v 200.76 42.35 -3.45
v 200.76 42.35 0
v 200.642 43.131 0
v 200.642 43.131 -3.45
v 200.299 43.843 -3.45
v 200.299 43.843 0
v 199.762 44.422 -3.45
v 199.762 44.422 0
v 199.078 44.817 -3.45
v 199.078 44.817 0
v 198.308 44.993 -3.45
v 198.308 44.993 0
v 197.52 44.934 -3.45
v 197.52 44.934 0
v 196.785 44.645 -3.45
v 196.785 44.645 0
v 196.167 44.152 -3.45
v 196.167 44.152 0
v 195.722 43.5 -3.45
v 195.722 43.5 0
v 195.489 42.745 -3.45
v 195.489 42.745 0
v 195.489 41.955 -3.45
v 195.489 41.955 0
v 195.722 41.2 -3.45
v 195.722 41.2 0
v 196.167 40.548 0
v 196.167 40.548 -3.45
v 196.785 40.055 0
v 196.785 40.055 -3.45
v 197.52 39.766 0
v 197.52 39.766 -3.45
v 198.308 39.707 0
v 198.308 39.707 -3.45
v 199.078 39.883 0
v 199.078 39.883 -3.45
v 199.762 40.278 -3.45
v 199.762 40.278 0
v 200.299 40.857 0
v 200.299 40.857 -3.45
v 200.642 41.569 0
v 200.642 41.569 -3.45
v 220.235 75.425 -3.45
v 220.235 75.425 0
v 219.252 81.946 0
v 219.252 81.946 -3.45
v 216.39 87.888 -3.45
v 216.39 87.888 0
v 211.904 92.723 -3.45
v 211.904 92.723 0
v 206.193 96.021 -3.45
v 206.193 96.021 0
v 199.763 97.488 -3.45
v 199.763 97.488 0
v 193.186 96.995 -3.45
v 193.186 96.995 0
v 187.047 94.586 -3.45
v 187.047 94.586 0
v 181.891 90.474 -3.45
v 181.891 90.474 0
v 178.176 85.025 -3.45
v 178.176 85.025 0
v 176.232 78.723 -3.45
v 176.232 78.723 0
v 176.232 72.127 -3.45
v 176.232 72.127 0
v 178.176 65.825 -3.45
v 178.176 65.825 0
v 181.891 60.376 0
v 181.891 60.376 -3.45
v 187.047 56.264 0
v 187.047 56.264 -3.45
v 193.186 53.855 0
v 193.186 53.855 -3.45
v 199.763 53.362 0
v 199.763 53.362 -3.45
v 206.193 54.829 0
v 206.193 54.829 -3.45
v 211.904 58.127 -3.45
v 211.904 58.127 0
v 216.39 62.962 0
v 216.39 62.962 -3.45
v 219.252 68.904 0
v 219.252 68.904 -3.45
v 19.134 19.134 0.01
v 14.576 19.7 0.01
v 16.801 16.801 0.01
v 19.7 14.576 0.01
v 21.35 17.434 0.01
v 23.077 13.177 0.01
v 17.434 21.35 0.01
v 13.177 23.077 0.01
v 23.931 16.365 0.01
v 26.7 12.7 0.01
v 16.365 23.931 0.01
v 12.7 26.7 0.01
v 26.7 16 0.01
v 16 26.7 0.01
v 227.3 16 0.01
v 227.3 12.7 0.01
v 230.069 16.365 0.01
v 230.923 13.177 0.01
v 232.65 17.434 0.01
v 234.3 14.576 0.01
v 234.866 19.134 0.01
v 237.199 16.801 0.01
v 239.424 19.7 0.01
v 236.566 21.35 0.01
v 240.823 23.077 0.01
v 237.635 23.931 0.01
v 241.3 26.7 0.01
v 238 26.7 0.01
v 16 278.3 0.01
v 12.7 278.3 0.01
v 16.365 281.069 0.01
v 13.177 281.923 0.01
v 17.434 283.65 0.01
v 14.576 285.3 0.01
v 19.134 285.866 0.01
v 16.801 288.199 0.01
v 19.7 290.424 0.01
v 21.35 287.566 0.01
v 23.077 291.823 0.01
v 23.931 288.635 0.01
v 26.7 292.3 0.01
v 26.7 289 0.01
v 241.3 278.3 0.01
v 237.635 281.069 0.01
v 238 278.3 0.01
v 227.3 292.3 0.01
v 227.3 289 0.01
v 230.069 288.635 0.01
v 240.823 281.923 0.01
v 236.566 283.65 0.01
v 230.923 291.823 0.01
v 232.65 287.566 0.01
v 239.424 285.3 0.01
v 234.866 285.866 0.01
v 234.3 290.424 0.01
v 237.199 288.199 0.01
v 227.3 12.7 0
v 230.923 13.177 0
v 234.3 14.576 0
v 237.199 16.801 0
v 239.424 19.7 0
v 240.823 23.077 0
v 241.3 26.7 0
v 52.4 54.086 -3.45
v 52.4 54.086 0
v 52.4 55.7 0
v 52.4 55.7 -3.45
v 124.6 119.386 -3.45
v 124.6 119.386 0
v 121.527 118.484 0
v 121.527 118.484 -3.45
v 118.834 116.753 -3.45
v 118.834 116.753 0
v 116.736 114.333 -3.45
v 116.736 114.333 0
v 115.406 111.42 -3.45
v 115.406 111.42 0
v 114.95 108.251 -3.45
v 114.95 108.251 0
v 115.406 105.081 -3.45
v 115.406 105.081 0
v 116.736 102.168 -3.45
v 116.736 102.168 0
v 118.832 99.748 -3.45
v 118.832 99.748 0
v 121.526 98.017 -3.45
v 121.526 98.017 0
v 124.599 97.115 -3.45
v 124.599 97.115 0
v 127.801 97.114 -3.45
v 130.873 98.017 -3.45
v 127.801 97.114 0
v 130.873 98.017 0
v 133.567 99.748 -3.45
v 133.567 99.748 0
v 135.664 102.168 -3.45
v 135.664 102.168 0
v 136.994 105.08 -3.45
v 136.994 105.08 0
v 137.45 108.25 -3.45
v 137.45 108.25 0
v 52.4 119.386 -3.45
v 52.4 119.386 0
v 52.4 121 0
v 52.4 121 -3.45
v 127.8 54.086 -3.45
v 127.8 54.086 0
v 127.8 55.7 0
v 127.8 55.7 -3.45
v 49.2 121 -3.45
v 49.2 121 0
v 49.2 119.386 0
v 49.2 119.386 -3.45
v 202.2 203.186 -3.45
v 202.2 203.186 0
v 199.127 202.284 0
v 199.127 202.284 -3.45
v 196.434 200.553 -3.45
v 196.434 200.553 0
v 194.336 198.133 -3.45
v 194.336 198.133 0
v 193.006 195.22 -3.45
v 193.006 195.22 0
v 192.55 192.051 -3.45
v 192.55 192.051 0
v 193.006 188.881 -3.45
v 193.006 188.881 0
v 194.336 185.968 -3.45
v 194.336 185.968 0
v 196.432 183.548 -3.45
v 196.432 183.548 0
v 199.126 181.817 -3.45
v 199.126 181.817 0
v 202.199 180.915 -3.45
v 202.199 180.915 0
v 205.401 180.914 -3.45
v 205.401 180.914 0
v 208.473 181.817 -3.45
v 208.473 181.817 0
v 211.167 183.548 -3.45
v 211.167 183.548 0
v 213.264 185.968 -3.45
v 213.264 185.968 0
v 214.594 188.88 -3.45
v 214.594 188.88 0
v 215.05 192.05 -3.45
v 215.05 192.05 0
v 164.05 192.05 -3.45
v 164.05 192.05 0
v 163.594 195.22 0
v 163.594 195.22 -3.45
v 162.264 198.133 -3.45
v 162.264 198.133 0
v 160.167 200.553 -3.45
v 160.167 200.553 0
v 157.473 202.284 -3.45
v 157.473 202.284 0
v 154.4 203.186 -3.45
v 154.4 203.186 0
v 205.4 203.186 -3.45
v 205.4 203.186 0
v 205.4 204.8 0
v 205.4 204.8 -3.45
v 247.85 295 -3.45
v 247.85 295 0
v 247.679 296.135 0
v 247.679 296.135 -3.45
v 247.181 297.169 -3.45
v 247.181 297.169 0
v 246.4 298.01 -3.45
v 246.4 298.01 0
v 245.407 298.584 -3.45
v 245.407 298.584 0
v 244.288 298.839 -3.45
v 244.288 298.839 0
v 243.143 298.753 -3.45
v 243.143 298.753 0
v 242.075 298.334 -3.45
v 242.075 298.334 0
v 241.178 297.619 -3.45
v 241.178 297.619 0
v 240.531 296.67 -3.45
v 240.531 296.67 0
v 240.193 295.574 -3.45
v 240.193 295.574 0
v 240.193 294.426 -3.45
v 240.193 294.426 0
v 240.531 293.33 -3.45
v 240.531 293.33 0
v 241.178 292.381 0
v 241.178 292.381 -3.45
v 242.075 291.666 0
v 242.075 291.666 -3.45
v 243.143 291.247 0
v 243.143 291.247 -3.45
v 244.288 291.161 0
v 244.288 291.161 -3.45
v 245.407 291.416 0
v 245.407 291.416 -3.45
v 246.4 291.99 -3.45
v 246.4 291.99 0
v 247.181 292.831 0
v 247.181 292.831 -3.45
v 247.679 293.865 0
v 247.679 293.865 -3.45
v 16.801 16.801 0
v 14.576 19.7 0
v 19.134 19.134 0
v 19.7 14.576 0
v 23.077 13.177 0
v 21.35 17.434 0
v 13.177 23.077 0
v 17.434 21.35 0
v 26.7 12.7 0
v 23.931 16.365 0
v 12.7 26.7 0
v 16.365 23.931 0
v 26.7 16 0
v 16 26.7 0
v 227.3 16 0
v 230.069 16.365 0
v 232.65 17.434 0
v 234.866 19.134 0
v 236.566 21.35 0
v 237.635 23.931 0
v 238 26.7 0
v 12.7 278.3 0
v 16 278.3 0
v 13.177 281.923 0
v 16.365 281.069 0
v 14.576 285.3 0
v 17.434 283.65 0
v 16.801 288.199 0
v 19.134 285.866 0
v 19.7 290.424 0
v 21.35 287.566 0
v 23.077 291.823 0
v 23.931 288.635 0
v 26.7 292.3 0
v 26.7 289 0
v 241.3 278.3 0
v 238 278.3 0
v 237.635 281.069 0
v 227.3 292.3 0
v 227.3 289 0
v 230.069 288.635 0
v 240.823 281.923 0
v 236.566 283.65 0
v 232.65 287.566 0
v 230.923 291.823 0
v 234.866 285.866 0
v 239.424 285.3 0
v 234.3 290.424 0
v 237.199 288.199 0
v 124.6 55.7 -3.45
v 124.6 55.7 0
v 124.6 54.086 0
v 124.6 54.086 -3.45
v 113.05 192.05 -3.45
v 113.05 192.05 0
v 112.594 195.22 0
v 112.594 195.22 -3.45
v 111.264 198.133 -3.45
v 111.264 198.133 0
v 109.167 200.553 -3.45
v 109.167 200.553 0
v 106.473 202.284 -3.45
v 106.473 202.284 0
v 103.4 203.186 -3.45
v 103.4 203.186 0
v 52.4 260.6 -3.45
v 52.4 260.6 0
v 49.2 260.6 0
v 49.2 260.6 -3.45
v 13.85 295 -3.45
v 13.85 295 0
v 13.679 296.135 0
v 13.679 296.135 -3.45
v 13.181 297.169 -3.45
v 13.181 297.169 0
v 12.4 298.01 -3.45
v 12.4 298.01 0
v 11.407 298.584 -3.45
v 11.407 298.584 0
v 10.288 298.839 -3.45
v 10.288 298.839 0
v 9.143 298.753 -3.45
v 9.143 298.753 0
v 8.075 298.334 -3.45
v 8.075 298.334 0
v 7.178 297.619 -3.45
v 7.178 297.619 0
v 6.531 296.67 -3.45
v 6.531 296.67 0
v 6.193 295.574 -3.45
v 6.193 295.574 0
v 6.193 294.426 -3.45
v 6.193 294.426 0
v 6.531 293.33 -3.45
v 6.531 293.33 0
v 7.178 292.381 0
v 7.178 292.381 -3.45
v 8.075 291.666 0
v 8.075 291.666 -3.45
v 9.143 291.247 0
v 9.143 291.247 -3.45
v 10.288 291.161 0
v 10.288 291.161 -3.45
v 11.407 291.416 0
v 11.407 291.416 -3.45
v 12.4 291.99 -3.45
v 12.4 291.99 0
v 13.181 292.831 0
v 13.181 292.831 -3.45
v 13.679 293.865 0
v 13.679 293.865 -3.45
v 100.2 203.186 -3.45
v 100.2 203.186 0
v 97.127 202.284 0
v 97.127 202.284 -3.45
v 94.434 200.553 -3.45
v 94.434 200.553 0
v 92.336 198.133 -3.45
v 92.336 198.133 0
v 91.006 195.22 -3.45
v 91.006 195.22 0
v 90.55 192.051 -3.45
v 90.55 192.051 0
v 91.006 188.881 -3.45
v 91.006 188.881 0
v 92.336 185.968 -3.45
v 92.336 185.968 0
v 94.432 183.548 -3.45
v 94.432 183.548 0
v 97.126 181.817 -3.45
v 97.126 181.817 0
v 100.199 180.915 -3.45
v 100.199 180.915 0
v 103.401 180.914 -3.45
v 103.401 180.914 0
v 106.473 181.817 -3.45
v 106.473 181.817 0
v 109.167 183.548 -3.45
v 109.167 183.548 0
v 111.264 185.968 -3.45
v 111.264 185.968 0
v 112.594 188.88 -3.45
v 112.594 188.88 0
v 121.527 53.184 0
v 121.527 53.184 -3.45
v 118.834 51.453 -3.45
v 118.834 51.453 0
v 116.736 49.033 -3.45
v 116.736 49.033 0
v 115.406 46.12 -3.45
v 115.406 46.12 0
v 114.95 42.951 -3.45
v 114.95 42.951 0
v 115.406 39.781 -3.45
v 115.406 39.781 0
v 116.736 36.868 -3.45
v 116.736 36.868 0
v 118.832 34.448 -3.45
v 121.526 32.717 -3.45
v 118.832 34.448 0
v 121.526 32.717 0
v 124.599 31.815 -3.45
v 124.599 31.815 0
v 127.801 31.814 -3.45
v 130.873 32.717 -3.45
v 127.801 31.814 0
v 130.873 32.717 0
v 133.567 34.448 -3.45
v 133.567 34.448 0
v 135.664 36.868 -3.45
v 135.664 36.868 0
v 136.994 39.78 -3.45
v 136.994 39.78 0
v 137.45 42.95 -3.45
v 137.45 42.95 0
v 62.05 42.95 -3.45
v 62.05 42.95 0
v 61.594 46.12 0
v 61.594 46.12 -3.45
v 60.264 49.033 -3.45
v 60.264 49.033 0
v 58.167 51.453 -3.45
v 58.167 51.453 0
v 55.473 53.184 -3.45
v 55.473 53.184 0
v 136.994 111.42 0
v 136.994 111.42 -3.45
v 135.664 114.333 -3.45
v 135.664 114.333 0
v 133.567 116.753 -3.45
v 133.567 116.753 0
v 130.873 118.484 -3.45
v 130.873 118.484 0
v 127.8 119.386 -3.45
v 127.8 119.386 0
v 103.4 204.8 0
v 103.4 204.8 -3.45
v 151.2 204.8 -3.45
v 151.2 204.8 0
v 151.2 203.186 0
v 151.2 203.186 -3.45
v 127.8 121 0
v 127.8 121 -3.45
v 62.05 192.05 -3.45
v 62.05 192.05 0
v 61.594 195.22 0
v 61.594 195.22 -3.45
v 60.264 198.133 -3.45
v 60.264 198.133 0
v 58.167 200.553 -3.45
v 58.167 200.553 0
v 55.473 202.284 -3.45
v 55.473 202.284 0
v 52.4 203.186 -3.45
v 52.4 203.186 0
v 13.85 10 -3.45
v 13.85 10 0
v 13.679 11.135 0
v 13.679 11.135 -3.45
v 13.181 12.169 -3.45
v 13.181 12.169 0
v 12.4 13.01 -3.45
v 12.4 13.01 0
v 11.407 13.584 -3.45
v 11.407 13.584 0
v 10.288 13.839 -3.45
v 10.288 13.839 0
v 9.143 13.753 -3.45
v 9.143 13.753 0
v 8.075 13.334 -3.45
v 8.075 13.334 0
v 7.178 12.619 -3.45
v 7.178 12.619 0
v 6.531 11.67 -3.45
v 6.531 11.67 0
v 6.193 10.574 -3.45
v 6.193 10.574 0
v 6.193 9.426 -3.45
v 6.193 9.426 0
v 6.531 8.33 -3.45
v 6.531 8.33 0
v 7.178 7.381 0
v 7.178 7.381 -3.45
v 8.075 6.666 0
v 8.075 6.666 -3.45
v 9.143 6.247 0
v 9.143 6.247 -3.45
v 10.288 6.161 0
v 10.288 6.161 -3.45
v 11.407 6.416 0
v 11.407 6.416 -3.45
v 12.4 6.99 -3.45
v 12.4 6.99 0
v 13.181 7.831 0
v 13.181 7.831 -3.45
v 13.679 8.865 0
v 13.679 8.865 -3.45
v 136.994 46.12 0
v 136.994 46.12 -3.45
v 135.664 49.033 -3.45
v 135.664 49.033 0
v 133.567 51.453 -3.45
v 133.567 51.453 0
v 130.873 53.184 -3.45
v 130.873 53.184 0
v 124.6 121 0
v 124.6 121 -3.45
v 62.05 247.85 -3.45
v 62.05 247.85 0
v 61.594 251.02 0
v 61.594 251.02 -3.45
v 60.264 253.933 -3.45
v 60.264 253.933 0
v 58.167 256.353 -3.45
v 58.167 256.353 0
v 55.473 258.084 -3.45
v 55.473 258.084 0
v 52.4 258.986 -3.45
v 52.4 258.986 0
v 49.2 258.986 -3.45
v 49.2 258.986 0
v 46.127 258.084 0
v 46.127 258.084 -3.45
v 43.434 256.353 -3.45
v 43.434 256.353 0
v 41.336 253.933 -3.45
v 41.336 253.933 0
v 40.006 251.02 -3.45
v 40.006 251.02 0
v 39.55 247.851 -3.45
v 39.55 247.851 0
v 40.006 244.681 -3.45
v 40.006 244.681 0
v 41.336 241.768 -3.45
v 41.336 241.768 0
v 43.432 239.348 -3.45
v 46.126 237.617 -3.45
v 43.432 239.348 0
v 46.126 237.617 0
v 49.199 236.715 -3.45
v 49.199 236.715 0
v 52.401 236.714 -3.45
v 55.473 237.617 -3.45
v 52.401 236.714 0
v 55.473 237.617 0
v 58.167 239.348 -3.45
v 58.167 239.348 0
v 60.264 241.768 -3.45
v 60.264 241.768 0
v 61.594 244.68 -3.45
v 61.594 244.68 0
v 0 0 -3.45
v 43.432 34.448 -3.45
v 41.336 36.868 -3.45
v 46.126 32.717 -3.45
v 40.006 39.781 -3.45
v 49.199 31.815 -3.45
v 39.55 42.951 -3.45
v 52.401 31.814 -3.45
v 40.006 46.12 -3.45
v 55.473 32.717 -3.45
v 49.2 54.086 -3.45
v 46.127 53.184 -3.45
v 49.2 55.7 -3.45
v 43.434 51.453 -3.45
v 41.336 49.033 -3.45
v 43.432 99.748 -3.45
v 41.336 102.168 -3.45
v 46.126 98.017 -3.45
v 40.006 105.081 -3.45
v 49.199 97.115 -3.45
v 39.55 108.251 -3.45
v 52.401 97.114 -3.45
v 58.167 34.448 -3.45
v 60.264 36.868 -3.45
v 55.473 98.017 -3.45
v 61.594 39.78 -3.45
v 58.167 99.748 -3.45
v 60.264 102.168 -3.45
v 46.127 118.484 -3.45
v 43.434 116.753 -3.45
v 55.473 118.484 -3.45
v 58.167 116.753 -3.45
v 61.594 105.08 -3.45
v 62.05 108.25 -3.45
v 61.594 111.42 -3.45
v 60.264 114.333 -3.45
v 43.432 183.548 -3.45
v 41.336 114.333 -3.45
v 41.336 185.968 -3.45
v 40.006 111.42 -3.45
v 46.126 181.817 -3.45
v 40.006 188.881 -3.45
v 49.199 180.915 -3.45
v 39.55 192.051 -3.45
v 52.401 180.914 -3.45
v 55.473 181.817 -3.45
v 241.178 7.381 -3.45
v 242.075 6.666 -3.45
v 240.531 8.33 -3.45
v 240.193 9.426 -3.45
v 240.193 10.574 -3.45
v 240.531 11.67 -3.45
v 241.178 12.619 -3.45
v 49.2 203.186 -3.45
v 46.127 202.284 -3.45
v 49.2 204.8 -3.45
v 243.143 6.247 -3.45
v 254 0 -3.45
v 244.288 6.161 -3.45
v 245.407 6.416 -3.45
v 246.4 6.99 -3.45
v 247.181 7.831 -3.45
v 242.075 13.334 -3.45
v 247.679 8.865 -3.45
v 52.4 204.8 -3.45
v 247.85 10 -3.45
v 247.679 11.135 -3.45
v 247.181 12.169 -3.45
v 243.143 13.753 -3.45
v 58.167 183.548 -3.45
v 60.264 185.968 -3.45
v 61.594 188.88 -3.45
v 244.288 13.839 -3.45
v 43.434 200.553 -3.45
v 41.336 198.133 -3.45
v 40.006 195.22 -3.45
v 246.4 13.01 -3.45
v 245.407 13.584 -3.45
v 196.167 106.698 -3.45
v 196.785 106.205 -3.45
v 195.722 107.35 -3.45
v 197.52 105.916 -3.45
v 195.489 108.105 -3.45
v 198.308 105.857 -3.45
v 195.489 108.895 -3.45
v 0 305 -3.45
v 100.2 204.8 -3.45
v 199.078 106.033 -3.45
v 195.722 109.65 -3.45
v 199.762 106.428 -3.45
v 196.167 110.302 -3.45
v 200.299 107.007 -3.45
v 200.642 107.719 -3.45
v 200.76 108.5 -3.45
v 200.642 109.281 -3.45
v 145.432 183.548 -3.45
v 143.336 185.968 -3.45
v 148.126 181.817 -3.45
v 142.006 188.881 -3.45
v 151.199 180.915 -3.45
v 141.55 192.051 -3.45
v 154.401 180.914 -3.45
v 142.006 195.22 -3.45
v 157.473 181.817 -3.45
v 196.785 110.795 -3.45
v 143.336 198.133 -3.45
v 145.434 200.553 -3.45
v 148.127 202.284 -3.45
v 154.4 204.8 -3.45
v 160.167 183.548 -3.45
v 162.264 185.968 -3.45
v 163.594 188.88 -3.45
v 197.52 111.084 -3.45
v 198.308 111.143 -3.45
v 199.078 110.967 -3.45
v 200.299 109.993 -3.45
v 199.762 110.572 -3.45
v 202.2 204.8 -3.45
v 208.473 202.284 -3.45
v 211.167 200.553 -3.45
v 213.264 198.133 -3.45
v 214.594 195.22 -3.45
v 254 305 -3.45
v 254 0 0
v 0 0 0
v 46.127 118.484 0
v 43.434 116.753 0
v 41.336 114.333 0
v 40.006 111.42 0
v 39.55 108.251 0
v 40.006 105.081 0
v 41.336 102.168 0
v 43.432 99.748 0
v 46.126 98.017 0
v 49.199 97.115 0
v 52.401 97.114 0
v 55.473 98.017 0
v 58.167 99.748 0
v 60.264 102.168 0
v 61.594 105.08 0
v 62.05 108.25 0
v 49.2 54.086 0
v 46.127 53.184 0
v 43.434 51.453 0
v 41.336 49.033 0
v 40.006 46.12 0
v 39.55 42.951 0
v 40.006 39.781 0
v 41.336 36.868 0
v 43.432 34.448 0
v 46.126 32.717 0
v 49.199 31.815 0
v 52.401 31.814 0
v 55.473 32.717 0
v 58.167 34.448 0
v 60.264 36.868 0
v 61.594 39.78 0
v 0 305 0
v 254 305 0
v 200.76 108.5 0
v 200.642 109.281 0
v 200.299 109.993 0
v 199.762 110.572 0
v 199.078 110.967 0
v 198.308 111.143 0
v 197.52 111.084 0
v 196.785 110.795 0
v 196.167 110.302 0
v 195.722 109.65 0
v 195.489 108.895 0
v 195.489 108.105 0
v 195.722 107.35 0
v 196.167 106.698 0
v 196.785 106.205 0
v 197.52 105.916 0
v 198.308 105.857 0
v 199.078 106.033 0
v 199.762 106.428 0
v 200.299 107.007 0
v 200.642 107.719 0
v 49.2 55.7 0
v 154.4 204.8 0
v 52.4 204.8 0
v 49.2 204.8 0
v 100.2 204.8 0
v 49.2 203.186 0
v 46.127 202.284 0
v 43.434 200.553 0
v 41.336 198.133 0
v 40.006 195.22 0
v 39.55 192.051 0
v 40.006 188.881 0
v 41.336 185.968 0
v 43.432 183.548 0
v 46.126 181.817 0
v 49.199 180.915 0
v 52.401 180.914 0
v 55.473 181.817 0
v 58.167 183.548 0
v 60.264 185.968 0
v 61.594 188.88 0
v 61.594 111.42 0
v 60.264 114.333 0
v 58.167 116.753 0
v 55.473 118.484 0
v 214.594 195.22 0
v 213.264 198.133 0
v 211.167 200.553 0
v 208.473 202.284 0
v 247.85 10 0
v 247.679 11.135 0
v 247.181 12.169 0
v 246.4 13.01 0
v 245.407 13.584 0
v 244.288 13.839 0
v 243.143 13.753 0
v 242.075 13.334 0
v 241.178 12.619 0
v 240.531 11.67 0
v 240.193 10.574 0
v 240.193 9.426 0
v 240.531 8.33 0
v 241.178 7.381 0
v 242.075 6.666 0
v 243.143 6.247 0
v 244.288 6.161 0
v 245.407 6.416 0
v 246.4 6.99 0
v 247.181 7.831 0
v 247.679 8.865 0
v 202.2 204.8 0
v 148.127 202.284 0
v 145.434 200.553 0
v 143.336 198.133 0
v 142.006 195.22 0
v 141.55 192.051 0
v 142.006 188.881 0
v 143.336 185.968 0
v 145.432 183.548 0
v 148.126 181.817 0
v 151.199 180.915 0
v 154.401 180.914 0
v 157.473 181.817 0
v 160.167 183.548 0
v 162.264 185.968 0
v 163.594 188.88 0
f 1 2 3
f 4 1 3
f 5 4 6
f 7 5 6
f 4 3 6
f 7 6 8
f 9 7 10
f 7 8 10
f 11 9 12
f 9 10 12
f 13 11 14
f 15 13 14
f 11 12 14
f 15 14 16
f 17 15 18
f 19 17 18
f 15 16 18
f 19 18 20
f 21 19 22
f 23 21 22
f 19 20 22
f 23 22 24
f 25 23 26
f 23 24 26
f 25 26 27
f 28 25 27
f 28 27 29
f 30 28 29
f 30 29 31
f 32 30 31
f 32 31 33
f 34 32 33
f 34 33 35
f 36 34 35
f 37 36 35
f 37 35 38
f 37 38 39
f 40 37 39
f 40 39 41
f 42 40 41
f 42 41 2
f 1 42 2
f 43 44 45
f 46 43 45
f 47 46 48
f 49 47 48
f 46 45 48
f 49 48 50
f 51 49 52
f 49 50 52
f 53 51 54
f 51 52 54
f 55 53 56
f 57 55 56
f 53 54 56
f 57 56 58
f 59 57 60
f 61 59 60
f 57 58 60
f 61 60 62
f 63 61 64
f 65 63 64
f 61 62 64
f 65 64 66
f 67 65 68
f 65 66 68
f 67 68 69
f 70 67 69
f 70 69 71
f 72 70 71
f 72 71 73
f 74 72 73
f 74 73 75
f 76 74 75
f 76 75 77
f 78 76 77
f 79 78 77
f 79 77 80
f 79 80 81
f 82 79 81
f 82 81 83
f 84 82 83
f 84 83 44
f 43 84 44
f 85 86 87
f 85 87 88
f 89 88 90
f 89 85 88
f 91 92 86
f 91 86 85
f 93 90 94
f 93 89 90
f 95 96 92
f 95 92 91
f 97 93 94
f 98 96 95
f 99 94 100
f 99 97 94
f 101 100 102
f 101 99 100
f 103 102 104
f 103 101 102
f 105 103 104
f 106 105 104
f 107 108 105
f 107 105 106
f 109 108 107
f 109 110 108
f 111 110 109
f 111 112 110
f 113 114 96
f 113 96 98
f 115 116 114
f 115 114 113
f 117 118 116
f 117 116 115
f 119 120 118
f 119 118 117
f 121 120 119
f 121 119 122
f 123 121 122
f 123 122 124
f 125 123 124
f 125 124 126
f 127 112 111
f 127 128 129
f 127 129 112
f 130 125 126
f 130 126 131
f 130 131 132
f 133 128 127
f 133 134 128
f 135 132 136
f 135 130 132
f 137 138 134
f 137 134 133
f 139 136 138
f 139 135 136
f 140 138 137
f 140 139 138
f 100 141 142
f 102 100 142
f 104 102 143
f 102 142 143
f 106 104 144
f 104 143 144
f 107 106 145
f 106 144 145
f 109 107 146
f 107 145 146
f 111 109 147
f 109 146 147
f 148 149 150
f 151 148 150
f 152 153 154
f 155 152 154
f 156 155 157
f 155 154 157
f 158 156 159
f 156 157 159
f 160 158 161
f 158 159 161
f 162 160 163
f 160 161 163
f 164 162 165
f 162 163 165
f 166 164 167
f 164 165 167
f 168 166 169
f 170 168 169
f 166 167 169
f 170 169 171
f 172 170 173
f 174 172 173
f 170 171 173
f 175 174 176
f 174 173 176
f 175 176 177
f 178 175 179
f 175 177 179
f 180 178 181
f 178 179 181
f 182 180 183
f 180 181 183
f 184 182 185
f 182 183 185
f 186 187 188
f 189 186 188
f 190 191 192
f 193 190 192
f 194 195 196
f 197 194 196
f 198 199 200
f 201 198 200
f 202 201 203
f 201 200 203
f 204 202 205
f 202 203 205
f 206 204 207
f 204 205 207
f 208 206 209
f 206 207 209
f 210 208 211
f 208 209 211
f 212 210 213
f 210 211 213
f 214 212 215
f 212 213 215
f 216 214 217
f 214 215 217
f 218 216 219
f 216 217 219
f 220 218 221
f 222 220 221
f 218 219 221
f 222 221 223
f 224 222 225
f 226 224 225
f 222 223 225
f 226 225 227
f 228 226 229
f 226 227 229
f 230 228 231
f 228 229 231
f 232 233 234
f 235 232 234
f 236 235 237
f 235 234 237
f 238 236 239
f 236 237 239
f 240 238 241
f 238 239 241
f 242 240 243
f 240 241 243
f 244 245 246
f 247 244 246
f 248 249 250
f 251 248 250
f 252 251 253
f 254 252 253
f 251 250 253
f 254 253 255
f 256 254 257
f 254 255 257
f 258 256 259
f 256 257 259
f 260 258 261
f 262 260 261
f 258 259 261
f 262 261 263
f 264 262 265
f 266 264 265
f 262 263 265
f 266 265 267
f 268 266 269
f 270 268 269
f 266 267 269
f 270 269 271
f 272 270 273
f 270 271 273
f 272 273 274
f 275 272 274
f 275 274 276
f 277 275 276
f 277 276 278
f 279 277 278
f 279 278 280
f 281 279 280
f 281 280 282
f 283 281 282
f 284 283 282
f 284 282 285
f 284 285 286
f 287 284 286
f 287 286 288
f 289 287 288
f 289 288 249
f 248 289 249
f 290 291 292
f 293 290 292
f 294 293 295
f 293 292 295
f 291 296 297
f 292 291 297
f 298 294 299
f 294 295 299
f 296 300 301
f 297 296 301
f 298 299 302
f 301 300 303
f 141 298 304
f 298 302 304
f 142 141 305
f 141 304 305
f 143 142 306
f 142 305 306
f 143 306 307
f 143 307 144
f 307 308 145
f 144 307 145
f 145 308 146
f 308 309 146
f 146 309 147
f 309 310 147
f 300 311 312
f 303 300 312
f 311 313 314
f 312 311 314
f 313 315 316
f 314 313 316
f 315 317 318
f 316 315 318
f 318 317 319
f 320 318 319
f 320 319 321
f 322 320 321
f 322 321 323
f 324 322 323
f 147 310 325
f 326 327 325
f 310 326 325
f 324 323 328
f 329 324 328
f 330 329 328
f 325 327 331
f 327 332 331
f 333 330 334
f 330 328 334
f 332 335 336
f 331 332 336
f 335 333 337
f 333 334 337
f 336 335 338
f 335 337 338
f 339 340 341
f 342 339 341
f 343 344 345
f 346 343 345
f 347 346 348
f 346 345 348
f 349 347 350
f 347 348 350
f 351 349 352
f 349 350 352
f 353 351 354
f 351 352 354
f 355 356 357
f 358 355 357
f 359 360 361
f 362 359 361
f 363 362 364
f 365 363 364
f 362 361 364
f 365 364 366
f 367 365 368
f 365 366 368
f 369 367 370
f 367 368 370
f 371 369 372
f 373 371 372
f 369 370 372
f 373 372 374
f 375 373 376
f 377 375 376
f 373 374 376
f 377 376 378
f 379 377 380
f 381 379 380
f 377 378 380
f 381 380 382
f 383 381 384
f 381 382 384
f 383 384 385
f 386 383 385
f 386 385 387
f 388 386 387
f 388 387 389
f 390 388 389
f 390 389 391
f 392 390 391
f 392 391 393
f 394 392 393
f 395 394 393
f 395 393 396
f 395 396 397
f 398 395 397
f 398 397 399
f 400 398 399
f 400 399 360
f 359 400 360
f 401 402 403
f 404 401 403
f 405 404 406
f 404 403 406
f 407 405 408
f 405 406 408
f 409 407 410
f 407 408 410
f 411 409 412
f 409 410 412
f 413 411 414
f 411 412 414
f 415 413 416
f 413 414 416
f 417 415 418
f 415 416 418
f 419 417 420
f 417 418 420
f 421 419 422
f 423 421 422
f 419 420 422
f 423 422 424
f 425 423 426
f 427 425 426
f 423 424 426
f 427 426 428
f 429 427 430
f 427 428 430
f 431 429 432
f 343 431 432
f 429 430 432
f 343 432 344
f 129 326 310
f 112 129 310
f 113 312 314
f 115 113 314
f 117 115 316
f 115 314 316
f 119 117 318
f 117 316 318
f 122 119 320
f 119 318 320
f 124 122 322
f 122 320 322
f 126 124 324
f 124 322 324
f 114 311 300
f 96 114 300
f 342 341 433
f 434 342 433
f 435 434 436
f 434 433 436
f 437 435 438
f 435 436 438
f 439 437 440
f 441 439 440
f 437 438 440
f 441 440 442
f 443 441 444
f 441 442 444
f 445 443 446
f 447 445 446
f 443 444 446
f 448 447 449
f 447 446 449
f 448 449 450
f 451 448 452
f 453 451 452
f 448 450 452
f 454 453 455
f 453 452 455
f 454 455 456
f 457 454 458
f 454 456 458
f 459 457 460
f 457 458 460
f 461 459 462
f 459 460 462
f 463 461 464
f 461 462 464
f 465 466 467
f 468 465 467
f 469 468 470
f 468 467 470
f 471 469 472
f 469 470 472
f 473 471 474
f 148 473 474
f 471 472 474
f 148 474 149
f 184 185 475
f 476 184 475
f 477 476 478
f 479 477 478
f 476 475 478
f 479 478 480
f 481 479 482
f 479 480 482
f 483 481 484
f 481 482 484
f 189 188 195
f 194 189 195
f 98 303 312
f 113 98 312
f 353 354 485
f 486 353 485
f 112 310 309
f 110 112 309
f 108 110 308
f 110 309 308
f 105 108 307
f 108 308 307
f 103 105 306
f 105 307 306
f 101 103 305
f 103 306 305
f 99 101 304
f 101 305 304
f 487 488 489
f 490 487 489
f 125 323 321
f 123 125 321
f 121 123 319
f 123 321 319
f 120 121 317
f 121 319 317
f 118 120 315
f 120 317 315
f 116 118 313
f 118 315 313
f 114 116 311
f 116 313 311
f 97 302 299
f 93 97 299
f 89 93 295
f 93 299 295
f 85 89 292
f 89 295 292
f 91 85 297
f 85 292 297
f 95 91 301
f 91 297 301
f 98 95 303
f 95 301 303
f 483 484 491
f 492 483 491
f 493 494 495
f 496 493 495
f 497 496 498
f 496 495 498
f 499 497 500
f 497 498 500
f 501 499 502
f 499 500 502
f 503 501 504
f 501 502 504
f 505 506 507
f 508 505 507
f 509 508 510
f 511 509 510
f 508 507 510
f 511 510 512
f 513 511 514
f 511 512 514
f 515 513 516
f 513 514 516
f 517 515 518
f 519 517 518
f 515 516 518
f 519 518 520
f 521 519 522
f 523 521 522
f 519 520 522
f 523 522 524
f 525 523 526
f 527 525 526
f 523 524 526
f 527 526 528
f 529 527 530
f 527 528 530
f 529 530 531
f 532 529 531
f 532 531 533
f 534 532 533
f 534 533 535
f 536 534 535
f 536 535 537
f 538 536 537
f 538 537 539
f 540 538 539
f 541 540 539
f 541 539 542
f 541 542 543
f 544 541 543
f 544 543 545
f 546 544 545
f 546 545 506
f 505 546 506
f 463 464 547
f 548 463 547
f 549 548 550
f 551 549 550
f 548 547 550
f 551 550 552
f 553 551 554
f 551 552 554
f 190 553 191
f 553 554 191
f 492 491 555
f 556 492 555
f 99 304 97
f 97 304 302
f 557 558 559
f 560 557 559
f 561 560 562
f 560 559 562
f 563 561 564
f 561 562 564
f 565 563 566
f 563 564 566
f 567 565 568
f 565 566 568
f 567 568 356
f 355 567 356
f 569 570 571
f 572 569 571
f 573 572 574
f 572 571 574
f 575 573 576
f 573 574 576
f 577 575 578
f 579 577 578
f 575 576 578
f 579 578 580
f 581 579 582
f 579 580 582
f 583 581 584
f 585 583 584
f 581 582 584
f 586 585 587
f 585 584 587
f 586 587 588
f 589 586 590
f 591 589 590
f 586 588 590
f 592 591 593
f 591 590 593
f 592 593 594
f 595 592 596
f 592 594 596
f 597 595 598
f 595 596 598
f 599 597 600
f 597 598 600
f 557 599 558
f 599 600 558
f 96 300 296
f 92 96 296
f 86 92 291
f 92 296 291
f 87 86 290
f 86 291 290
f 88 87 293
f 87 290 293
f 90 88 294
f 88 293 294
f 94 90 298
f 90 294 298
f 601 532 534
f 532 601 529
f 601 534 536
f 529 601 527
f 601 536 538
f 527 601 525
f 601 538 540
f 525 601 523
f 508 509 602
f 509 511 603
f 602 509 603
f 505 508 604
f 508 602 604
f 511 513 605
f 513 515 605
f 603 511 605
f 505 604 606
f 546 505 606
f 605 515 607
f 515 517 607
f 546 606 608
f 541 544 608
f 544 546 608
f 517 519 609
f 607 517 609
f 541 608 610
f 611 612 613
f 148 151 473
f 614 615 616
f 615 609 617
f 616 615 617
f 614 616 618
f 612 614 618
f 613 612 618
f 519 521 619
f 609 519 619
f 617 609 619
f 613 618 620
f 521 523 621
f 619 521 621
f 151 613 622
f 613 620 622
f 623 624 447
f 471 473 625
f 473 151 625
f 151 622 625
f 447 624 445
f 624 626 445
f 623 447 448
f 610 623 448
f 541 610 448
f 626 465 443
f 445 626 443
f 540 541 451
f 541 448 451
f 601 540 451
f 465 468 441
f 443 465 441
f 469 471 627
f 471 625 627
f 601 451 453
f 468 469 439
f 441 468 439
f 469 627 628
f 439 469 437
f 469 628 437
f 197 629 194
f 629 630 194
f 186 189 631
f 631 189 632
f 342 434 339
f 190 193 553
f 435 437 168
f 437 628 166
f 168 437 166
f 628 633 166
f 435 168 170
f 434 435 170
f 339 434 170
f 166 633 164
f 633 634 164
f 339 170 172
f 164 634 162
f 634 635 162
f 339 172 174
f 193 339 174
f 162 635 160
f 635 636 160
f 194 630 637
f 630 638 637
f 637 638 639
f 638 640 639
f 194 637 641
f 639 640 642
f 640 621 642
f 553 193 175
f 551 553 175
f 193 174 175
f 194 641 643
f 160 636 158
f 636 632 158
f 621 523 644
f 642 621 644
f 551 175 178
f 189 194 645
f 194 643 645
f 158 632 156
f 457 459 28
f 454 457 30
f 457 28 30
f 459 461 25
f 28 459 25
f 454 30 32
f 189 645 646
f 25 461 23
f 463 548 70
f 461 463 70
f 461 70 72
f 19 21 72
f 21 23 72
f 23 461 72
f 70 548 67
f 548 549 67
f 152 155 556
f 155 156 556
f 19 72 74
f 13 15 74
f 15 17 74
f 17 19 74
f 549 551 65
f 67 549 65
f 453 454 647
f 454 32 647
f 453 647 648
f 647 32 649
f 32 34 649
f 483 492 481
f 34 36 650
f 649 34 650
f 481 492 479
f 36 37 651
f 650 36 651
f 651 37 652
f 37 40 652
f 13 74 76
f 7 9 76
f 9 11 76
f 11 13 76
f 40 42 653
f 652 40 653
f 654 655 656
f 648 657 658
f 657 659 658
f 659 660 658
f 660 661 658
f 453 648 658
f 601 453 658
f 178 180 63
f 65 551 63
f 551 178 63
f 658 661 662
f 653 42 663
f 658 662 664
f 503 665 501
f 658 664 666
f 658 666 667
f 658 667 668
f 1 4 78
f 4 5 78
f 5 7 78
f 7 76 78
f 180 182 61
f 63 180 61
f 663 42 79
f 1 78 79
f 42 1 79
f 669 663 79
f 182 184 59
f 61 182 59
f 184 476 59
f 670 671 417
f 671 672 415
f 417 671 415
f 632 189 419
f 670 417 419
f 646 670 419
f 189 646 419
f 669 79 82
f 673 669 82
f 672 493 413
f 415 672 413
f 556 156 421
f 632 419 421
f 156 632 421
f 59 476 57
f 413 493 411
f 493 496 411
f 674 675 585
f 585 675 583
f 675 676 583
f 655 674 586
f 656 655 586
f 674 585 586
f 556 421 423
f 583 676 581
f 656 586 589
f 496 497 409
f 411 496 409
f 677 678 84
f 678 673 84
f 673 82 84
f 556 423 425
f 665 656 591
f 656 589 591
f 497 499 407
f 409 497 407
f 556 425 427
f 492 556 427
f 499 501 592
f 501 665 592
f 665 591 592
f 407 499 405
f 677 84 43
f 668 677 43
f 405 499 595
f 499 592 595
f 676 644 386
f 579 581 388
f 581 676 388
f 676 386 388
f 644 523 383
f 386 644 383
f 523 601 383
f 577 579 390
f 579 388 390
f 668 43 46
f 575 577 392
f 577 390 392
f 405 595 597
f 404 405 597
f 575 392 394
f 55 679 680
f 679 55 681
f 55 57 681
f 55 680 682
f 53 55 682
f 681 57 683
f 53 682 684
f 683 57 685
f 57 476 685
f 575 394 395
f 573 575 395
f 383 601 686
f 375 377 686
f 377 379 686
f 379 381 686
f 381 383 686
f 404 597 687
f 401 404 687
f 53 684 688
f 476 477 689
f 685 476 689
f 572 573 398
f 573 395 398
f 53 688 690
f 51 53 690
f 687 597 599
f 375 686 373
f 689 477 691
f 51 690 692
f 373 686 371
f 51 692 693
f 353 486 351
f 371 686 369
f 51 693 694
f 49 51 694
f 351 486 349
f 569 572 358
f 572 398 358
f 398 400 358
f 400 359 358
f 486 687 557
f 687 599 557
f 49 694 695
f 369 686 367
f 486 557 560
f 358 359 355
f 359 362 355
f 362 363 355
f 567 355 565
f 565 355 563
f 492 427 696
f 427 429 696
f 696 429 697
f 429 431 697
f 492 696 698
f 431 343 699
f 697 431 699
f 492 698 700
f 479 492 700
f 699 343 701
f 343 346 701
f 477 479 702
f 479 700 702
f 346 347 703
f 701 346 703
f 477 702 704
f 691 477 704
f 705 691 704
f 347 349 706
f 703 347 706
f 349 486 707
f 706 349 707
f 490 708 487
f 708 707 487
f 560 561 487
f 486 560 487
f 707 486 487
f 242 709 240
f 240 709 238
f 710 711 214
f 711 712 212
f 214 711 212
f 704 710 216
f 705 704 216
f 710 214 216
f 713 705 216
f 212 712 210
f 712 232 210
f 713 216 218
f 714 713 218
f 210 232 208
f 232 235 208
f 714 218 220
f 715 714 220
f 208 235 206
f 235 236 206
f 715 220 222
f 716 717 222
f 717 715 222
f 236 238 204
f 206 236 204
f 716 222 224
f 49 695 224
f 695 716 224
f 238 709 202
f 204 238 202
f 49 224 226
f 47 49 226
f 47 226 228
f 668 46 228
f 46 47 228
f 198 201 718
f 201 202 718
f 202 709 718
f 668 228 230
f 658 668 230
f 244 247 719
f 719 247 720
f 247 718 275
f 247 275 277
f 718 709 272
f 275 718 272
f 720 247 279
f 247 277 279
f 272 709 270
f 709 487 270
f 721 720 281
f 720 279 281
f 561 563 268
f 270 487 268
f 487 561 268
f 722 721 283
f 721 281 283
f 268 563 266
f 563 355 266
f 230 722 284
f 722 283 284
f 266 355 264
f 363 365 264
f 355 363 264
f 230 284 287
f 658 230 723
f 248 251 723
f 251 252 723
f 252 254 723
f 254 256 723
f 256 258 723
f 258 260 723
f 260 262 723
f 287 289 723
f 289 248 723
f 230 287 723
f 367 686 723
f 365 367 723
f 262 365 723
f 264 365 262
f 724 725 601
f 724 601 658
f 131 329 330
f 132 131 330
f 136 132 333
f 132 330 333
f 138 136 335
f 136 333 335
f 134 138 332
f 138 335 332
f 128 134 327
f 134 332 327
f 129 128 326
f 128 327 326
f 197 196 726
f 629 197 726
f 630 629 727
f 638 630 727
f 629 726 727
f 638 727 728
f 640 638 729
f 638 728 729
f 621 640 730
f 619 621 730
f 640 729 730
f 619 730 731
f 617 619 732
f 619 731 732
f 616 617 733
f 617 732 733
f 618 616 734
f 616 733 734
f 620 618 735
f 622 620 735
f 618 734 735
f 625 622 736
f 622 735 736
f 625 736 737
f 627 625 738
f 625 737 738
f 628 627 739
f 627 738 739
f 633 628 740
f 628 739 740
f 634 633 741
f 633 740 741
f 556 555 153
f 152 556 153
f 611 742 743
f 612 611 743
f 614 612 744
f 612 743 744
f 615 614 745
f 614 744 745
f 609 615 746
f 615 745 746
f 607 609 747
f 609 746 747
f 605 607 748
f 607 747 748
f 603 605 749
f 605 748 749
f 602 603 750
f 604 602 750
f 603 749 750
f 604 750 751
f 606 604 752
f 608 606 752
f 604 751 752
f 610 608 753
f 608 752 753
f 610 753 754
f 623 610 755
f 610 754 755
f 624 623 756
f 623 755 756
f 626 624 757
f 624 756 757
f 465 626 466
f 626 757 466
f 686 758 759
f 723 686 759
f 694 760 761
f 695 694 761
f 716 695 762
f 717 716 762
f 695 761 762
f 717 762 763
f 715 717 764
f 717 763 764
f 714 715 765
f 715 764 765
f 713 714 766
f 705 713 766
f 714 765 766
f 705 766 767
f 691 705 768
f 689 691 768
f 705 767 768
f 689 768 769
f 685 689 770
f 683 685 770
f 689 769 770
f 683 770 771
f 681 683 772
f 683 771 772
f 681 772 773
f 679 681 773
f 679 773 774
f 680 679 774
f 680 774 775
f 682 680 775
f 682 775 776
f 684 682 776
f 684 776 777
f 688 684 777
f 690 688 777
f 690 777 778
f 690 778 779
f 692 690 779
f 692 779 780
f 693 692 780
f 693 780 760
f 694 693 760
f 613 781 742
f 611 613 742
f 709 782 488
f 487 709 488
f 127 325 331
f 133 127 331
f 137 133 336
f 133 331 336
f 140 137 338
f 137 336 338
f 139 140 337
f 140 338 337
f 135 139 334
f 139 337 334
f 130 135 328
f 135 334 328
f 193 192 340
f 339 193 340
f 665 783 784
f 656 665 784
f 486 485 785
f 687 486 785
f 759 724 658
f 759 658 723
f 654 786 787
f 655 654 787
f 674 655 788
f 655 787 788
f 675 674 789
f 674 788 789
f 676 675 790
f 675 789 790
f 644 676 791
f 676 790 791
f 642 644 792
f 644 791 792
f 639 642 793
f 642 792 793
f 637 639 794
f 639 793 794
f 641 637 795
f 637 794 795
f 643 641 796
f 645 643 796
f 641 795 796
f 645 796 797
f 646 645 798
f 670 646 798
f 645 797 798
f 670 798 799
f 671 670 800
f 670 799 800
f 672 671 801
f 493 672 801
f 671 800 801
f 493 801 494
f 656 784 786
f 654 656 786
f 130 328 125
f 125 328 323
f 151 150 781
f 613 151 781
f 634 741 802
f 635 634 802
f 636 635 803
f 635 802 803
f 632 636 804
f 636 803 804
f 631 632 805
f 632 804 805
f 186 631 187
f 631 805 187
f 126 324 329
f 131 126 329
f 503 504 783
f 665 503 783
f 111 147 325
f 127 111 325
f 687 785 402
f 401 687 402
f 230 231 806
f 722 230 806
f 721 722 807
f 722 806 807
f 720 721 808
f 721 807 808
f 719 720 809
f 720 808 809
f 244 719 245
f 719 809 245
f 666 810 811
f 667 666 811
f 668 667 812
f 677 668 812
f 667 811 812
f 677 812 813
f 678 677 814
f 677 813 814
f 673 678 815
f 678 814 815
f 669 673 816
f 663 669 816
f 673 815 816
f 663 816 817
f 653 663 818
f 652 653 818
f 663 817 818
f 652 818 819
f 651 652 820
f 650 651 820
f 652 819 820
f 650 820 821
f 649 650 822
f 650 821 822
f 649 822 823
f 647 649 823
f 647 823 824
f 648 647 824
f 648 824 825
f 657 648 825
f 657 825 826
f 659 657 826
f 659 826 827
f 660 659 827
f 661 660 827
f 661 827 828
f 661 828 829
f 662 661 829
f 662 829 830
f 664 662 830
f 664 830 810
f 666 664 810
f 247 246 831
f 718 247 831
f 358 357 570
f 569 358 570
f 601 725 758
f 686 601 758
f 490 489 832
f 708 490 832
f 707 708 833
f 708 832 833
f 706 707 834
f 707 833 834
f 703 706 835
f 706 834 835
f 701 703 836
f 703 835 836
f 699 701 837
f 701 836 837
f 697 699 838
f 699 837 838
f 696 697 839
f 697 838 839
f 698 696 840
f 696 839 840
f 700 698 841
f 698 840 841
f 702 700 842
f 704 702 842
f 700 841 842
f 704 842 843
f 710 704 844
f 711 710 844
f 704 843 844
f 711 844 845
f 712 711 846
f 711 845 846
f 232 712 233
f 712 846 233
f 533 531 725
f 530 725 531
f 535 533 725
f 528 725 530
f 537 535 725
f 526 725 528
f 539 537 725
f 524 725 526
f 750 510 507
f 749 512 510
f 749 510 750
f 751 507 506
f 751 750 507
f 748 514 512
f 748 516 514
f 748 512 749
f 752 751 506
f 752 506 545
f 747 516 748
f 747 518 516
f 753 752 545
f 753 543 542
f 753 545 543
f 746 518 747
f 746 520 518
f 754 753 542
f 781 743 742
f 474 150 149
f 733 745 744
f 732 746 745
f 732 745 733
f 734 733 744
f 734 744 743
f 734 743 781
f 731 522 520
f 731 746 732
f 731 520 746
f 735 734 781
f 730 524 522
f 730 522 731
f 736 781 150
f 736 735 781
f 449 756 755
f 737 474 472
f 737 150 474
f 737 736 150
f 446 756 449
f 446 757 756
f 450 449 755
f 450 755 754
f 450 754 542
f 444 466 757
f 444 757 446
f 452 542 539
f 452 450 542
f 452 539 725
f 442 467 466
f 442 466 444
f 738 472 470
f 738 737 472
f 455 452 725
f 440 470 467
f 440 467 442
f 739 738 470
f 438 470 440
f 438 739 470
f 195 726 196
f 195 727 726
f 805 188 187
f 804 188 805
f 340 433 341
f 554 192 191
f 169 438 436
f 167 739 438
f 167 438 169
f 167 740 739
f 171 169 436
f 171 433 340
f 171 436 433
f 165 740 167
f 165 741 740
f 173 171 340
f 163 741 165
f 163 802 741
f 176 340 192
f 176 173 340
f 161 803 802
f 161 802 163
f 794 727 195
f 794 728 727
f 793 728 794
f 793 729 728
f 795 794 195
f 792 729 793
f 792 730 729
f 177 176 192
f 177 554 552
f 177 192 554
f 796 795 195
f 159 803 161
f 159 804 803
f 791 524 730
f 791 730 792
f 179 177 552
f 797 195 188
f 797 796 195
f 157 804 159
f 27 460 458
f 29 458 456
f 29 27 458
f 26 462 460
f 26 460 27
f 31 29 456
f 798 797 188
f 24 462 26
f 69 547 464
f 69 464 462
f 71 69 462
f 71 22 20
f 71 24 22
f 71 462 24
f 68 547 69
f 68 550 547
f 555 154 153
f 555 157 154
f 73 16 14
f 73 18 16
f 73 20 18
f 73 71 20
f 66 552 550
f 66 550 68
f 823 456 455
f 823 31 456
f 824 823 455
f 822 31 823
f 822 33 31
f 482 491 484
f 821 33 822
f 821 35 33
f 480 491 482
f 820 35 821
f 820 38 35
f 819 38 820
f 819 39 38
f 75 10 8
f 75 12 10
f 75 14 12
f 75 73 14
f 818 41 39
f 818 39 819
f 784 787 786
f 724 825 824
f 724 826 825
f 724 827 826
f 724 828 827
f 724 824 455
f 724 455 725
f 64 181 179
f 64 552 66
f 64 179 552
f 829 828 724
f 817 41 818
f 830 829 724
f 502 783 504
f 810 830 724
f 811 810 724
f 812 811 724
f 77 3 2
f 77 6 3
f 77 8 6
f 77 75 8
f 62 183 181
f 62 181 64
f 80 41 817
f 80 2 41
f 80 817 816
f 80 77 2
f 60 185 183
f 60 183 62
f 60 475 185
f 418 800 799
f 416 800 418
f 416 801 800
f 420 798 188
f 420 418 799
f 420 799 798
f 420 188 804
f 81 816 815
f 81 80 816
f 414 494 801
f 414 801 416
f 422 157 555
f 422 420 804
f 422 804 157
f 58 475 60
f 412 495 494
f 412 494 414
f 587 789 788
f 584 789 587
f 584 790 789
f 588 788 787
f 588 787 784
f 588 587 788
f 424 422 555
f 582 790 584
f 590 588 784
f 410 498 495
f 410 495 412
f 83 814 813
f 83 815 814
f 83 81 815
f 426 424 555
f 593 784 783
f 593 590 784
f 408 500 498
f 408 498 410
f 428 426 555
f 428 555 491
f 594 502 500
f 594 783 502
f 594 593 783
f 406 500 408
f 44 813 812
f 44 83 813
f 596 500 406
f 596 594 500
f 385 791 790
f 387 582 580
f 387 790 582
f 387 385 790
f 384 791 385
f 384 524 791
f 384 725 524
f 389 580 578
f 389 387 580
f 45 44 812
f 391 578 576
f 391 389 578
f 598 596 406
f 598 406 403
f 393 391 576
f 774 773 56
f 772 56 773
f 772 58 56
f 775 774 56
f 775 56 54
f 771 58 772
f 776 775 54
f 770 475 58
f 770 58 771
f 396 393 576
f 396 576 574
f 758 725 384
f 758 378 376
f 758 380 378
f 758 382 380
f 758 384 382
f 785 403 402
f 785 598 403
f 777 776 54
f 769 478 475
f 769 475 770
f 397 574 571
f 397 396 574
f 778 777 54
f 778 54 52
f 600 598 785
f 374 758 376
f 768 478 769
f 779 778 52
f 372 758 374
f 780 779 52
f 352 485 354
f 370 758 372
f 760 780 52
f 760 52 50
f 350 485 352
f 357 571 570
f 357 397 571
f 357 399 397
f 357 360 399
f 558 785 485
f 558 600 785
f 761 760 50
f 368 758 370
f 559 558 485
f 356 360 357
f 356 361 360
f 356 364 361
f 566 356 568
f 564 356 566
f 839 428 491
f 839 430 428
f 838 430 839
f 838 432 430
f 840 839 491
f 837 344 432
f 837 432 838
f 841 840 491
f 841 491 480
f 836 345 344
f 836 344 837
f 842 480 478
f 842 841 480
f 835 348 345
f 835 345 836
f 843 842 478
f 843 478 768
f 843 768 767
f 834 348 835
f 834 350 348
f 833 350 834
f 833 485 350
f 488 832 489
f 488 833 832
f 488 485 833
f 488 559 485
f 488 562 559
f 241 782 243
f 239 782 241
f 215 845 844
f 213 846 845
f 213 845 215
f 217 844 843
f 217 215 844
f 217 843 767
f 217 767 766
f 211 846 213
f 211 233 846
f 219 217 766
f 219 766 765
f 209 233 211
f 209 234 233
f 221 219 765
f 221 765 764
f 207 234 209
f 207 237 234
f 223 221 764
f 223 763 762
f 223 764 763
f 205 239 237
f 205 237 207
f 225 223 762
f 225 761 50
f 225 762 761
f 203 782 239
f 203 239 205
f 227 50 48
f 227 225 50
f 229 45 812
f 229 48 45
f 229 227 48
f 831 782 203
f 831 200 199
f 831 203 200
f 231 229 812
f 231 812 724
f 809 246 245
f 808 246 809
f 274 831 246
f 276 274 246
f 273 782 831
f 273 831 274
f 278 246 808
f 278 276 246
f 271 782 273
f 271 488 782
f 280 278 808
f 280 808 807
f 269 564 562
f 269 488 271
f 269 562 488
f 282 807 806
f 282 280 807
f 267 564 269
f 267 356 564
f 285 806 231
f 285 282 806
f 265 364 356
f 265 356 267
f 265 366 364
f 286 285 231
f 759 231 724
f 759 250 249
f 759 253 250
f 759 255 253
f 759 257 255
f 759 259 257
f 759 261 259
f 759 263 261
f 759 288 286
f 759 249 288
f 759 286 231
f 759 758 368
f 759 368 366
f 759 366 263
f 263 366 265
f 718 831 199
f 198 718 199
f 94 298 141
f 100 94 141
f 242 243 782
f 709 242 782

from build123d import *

# Parameters (mm, degrees)
F0_W      = 254
F0_H      = 305
F1_DEPTH  = 3.45
F2_DEPTH  = 0.01
F3_R      = 3.85
F4_DEPTH  = 3.451
F6_DEPTH  = 25
F8_DEPTH  = 25
F10_DEPTH = 25
F11_R     = 2.65
F11_R_2   = 22.125
F12_DEPTH = 25


with BuildPart() as f1:
    # F0 (on Top) → F1 (new body)
    with BuildSketch(Plane.XY):
        with Locations((127, 152.5)):
            Rectangle(F0_W, F0_H)
        with BuildLine():
            ThreePointArc((12.7, 278.3), (16.800505, 288.199495), (26.7, 292.3))
            Line((26.7, 292.3), (227.3, 292.3))
            ThreePointArc((227.3, 292.3), (237.199495, 288.199495), (241.3, 278.3))
            Line((241.3, 278.3), (241.3, 26.7))
            ThreePointArc((241.3, 26.7), (237.199495, 16.800505), (227.3, 12.7))
            Line((227.3, 12.7), (26.7, 12.7))
            ThreePointArc((26.7, 12.7), (16.800505, 16.800505), (12.7, 26.7))
            Line((12.7, 26.7), (12.7, 278.3))
        make_face(mode=Mode.SUBTRACT)
        with BuildLine():
            Line((227.3, 292.3), (26.7, 292.3))
            ThreePointArc((26.7, 292.3), (16.800505, 288.199495), (12.7, 278.3))
            Line((12.7, 278.3), (12.7, 26.7))
            ThreePointArc((12.7, 26.7), (16.800505, 16.800505), (26.7, 12.7))
            Line((26.7, 12.7), (227.3, 12.7))
            ThreePointArc((227.3, 12.7), (237.199495, 16.800505), (241.3, 26.7))
            Line((241.3, 26.7), (241.3, 278.3))
            ThreePointArc((241.3, 278.3), (237.199495, 288.199495), (227.3, 292.3))
        make_face()
        with BuildLine():
            Line((227.3, 16), (26.7, 16))
            ThreePointArc((26.7, 16), (19.133957, 19.133957), (16, 26.7))
            Line((16, 26.7), (16, 278.3))
            ThreePointArc((16, 278.3), (19.133957, 285.866043), (26.7, 289))
            Line((26.7, 289), (227.3, 289))
            ThreePointArc((227.3, 289), (234.866043, 285.866043), (238, 278.3))
            Line((238, 278.3), (238, 26.7))
            ThreePointArc((238, 26.7), (234.866043, 19.133957), (227.3, 16))
        make_face(mode=Mode.SUBTRACT)
        with BuildLine():
            ThreePointArc((16, 26.7), (19.133957, 19.133957), (26.7, 16))
            Line((26.7, 16), (227.3, 16))
            ThreePointArc((227.3, 16), (234.866043, 19.133957), (238, 26.7))
            Line((238, 26.7), (238, 278.3))
            ThreePointArc((238, 278.3), (234.866043, 285.866043), (227.3, 289))
            Line((227.3, 289), (26.7, 289))
            ThreePointArc((26.7, 289), (19.133957, 285.866043), (16, 278.3))
            Line((16, 278.3), (16, 26.7))
        make_face()
    extrude(amount=-F1_DEPTH)

    # F3 (on face) → F4 (cut, through all)
    with BuildSketch(Plane.XY):
        with Locations((244, 10)):
            Circle(F3_R)
        with Locations((10, 10)):
            Circle(F3_R)
        with Locations((244, 295)):
            Circle(F3_R)
        with Locations((10, 295)):
            Circle(F3_R)
    extrude(amount=-F4_DEPTH, mode=Mode.SUBTRACT)

    # F5 (on face) → F6 (cut)
    with BuildSketch(Plane.XY):
        with BuildLine():
            ThreePointArc((49.2, 258.985641), (50.8, 259.1), (52.4, 258.985641))
            Line((52.4, 258.985641), (52.4, 260.6))
            Line((52.4, 260.6), (49.2, 260.6))
            Line((49.2, 260.6), (49.2, 258.985641))
        make_face()
        with BuildLine():
            Line((52.4, 257.6), (52.4, 258.985641))
            ThreePointArc((52.4, 258.985641), (50.8, 259.1), (49.2, 258.985641))
            Line((49.2, 258.985641), (49.2, 257.6))
            Line((49.2, 257.6), (52.4, 257.6))
        make_face()
        with BuildLine():
            ThreePointArc((49.2, 258.985641), (43.432419, 239.348162), (62.05, 247.85))
            ThreePointArc((62.05, 247.85), (59.301838, 255.217581), (52.4, 258.985641))
            Line((52.4, 258.985641), (52.4, 257.6))
            Line((52.4, 257.6), (49.2, 257.6))
            Line((49.2, 257.6), (49.2, 258.985641))
        make_face()
    extrude(amount=-F6_DEPTH, mode=Mode.SUBTRACT)

    # F7 (on face) → F8 (cut)
    with BuildSketch(Plane.XY):
        with BuildLine():
            Line((52.4, 201.8), (52.4, 203.185641))
            ThreePointArc((52.4, 203.185641), (50.8, 203.3), (49.2, 203.185641))
            Line((49.2, 203.185641), (49.2, 201.8))
            Line((49.2, 201.8), (52.4, 201.8))
        make_face()
        with BuildLine():
            ThreePointArc((49.2, 203.185641), (50.8, 203.3), (52.4, 203.185641))
            Line((52.4, 203.185641), (52.4, 204.8))
            Line((52.4, 204.8), (49.2, 204.8))
            Line((49.2, 204.8), (49.2, 203.185641))
        make_face()
        with BuildLine():
            ThreePointArc((100.2, 203.185641), (101.8, 203.3), (103.4, 203.185641))
            Line((103.4, 203.185641), (103.4, 204.8))
            Line((103.4, 204.8), (100.2, 204.8))
            Line((100.2, 204.8), (100.2, 203.185641))
        make_face()
        with BuildLine():
            Line((103.4, 201.8), (103.4, 203.185641))
            ThreePointArc((103.4, 203.185641), (101.8, 203.3), (100.2, 203.185641))
            Line((100.2, 203.185641), (100.2, 201.8))
            Line((100.2, 201.8), (103.4, 201.8))
        make_face()
        with BuildLine():
            ThreePointArc((100.2, 203.185641), (94.432419, 183.548162), (113.05, 192.05))
            ThreePointArc((113.05, 192.05), (110.301838, 199.417581), (103.4, 203.185641))
            Line((103.4, 203.185641), (103.4, 201.8))
            Line((103.4, 201.8), (100.2, 201.8))
            Line((100.2, 201.8), (100.2, 203.185641))
        make_face()
        with BuildLine():
            ThreePointArc((49.2, 203.185641), (43.432419, 183.548162), (62.05, 192.05))
            ThreePointArc((62.05, 192.05), (59.301838, 199.417581), (52.4, 203.185641))
            Line((52.4, 203.185641), (52.4, 201.8))
            Line((52.4, 201.8), (49.2, 201.8))
            Line((49.2, 201.8), (49.2, 203.185641))
        make_face()
        with BuildLine():
            ThreePointArc((151.2, 203.185641), (152.8, 203.3), (154.4, 203.185641))
            Line((154.4, 203.185641), (154.4, 204.8))
            Line((154.4, 204.8), (151.2, 204.8))
            Line((151.2, 204.8), (151.2, 203.185641))
        make_face()
        with BuildLine():
            Line((154.4, 201.8), (154.4, 203.185641))
            ThreePointArc((154.4, 203.185641), (152.8, 203.3), (151.2, 203.185641))
            Line((151.2, 203.185641), (151.2, 201.8))
            Line((151.2, 201.8), (154.4, 201.8))
        make_face()
        with BuildLine():
            ThreePointArc((151.2, 203.185641), (145.432419, 183.548162), (164.05, 192.05))
            ThreePointArc((164.05, 192.05), (161.301838, 199.417581), (154.4, 203.185641))
            Line((154.4, 203.185641), (154.4, 201.8))
            Line((154.4, 201.8), (151.2, 201.8))
            Line((151.2, 201.8), (151.2, 203.185641))
        make_face()
        with BuildLine():
            ThreePointArc((202.2, 203.185641), (203.8, 203.3), (205.4, 203.185641))
            Line((205.4, 203.185641), (205.4, 204.8))
            Line((205.4, 204.8), (202.2, 204.8))
            Line((202.2, 204.8), (202.2, 203.185641))
        make_face()
        with BuildLine():
            Line((205.4, 201.8), (205.4, 203.185641))
            ThreePointArc((205.4, 203.185641), (203.8, 203.3), (202.2, 203.185641))
            Line((202.2, 203.185641), (202.2, 201.8))
            Line((202.2, 201.8), (205.4, 201.8))
        make_face()
        with BuildLine():
            ThreePointArc((202.2, 203.185641), (196.432419, 183.548162), (215.05, 192.05))
            ThreePointArc((215.05, 192.05), (212.301838, 199.417581), (205.4, 203.185641))
            Line((205.4, 203.185641), (205.4, 201.8))
            Line((205.4, 201.8), (202.2, 201.8))
            Line((202.2, 201.8), (202.2, 203.185641))
        make_face()
    extrude(amount=-F8_DEPTH, mode=Mode.SUBTRACT)

    # F9 (on face) → F10 (cut)
    with BuildSketch(Plane.XY):
        with BuildLine():
            ThreePointArc((49.2, 119.385641), (50.8, 119.5), (52.4, 119.385641))
            Line((52.4, 119.385641), (52.4, 121))
            Line((52.4, 121), (49.2, 121))
            Line((49.2, 121), (49.2, 119.385641))
        make_face()
        with BuildLine():
            Line((52.4, 118), (52.4, 119.385641))
            ThreePointArc((52.4, 119.385641), (50.8, 119.5), (49.2, 119.385641))
            Line((49.2, 119.385641), (49.2, 118))
            Line((49.2, 118), (52.4, 118))
        make_face()
        with BuildLine():
            ThreePointArc((49.2, 119.385641), (43.432419, 99.748162), (62.05, 108.25))
            ThreePointArc((62.05, 108.25), (59.301838, 115.617581), (52.4, 119.385641))
            Line((52.4, 119.385641), (52.4, 118))
            Line((52.4, 118), (49.2, 118))
            Line((49.2, 118), (49.2, 119.385641))
        make_face()
        with BuildLine():
            ThreePointArc((124.6, 119.385641), (126.2, 119.5), (127.8, 119.385641))
            Line((127.8, 119.385641), (127.8, 121))
            Line((127.8, 121), (124.6, 121))
            Line((124.6, 121), (124.6, 119.385641))
        make_face()
        with BuildLine():
            Line((127.8, 118), (127.8, 119.385641))
            ThreePointArc((127.8, 119.385641), (126.2, 119.5), (124.6, 119.385641))
            Line((124.6, 119.385641), (124.6, 118))
            Line((124.6, 118), (127.8, 118))
        make_face()
        with BuildLine():
            ThreePointArc((124.6, 119.385641), (118.832419, 99.748162), (137.45, 108.25))
            ThreePointArc((137.45, 108.25), (134.701838, 115.617581), (127.8, 119.385641))
            Line((127.8, 119.385641), (127.8, 118))
            Line((127.8, 118), (124.6, 118))
            Line((124.6, 118), (124.6, 119.385641))
        make_face()
        with BuildLine():
            ThreePointArc((124.6, 54.085641), (126.2, 54.2), (127.8, 54.085641))
            Line((127.8, 54.085641), (127.8, 55.7))
            Line((127.8, 55.7), (124.6, 55.7))
            Line((124.6, 55.7), (124.6, 54.085641))
        make_face()
        with BuildLine():
            Line((127.8, 52.7), (127.8, 54.085641))
            ThreePointArc((127.8, 54.085641), (126.2, 54.2), (124.6, 54.085641))
            Line((124.6, 54.085641), (124.6, 52.7))
            Line((124.6, 52.7), (127.8, 52.7))
        make_face()
        with BuildLine():
            ThreePointArc((124.6, 54.085641), (118.832419, 34.448162), (137.45, 42.95))
            ThreePointArc((137.45, 42.95), (134.701838, 50.317581), (127.8, 54.085641))
            Line((127.8, 54.085641), (127.8, 52.7))
            Line((127.8, 52.7), (124.6, 52.7))
            Line((124.6, 52.7), (124.6, 54.085641))
        make_face()
        with BuildLine():
            ThreePointArc((49.2, 54.085641), (50.8, 54.2), (52.4, 54.085641))
            Line((52.4, 54.085641), (52.4, 55.7))
            Line((52.4, 55.7), (49.2, 55.7))
            Line((49.2, 55.7), (49.2, 54.085641))
        make_face()
        with BuildLine():
            Line((52.4, 52.7), (52.4, 54.085641))
            ThreePointArc((52.4, 54.085641), (50.8, 54.2), (49.2, 54.085641))
            Line((49.2, 54.085641), (49.2, 52.7))
            Line((49.2, 52.7), (52.4, 52.7))
        make_face()
        with BuildLine():
            ThreePointArc((49.2, 54.085641), (43.432419, 34.448162), (62.05, 42.95))
            ThreePointArc((62.05, 42.95), (59.301838, 50.317581), (52.4, 54.085641))
            Line((52.4, 54.085641), (52.4, 52.7))
            Line((52.4, 52.7), (49.2, 52.7))
            Line((49.2, 52.7), (49.2, 54.085641))
        make_face()
    extrude(amount=-F10_DEPTH, mode=Mode.SUBTRACT)

    # F11 (on face) → F12 (cut)
    with BuildSketch(Plane.XY):
        with Locations((198.109612, 108.5)):
            Circle(F11_R)
        with Locations((198.109612, 42.35)):
            Circle(F11_R)
        with Locations((198.109612, 75.425)):
            Circle(F11_R_2)
    extrude(amount=-F12_DEPTH, mode=Mode.SUBTRACT)


with BuildPart() as f2:
    # F0 (on Top) → F2 (new body)
    with BuildSketch(Plane.XY):
        with BuildLine():
            Line((227.3, 292.3), (26.7, 292.3))
            ThreePointArc((26.7, 292.3), (16.800505, 288.199495), (12.7, 278.3))
            Line((12.7, 278.3), (12.7, 26.7))
            ThreePointArc((12.7, 26.7), (16.800505, 16.800505), (26.7, 12.7))
            Line((26.7, 12.7), (227.3, 12.7))
            ThreePointArc((227.3, 12.7), (237.199495, 16.800505), (241.3, 26.7))
            Line((241.3, 26.7), (241.3, 278.3))
            ThreePointArc((241.3, 278.3), (237.199495, 288.199495), (227.3, 292.3))
        make_face()
        with BuildLine():
            Line((227.3, 16), (26.7, 16))
            ThreePointArc((26.7, 16), (19.133957, 19.133957), (16, 26.7))
            Line((16, 26.7), (16, 278.3))
            ThreePointArc((16, 278.3), (19.133957, 285.866043), (26.7, 289))
            Line((26.7, 289), (227.3, 289))
            ThreePointArc((227.3, 289), (234.866043, 285.866043), (238, 278.3))
            Line((238, 278.3), (238, 26.7))
            ThreePointArc((238, 26.7), (234.866043, 19.133957), (227.3, 16))
        make_face(mode=Mode.SUBTRACT)
    extrude(amount=F2_DEPTH)


solid = Compound([f1.part, f2.part])
